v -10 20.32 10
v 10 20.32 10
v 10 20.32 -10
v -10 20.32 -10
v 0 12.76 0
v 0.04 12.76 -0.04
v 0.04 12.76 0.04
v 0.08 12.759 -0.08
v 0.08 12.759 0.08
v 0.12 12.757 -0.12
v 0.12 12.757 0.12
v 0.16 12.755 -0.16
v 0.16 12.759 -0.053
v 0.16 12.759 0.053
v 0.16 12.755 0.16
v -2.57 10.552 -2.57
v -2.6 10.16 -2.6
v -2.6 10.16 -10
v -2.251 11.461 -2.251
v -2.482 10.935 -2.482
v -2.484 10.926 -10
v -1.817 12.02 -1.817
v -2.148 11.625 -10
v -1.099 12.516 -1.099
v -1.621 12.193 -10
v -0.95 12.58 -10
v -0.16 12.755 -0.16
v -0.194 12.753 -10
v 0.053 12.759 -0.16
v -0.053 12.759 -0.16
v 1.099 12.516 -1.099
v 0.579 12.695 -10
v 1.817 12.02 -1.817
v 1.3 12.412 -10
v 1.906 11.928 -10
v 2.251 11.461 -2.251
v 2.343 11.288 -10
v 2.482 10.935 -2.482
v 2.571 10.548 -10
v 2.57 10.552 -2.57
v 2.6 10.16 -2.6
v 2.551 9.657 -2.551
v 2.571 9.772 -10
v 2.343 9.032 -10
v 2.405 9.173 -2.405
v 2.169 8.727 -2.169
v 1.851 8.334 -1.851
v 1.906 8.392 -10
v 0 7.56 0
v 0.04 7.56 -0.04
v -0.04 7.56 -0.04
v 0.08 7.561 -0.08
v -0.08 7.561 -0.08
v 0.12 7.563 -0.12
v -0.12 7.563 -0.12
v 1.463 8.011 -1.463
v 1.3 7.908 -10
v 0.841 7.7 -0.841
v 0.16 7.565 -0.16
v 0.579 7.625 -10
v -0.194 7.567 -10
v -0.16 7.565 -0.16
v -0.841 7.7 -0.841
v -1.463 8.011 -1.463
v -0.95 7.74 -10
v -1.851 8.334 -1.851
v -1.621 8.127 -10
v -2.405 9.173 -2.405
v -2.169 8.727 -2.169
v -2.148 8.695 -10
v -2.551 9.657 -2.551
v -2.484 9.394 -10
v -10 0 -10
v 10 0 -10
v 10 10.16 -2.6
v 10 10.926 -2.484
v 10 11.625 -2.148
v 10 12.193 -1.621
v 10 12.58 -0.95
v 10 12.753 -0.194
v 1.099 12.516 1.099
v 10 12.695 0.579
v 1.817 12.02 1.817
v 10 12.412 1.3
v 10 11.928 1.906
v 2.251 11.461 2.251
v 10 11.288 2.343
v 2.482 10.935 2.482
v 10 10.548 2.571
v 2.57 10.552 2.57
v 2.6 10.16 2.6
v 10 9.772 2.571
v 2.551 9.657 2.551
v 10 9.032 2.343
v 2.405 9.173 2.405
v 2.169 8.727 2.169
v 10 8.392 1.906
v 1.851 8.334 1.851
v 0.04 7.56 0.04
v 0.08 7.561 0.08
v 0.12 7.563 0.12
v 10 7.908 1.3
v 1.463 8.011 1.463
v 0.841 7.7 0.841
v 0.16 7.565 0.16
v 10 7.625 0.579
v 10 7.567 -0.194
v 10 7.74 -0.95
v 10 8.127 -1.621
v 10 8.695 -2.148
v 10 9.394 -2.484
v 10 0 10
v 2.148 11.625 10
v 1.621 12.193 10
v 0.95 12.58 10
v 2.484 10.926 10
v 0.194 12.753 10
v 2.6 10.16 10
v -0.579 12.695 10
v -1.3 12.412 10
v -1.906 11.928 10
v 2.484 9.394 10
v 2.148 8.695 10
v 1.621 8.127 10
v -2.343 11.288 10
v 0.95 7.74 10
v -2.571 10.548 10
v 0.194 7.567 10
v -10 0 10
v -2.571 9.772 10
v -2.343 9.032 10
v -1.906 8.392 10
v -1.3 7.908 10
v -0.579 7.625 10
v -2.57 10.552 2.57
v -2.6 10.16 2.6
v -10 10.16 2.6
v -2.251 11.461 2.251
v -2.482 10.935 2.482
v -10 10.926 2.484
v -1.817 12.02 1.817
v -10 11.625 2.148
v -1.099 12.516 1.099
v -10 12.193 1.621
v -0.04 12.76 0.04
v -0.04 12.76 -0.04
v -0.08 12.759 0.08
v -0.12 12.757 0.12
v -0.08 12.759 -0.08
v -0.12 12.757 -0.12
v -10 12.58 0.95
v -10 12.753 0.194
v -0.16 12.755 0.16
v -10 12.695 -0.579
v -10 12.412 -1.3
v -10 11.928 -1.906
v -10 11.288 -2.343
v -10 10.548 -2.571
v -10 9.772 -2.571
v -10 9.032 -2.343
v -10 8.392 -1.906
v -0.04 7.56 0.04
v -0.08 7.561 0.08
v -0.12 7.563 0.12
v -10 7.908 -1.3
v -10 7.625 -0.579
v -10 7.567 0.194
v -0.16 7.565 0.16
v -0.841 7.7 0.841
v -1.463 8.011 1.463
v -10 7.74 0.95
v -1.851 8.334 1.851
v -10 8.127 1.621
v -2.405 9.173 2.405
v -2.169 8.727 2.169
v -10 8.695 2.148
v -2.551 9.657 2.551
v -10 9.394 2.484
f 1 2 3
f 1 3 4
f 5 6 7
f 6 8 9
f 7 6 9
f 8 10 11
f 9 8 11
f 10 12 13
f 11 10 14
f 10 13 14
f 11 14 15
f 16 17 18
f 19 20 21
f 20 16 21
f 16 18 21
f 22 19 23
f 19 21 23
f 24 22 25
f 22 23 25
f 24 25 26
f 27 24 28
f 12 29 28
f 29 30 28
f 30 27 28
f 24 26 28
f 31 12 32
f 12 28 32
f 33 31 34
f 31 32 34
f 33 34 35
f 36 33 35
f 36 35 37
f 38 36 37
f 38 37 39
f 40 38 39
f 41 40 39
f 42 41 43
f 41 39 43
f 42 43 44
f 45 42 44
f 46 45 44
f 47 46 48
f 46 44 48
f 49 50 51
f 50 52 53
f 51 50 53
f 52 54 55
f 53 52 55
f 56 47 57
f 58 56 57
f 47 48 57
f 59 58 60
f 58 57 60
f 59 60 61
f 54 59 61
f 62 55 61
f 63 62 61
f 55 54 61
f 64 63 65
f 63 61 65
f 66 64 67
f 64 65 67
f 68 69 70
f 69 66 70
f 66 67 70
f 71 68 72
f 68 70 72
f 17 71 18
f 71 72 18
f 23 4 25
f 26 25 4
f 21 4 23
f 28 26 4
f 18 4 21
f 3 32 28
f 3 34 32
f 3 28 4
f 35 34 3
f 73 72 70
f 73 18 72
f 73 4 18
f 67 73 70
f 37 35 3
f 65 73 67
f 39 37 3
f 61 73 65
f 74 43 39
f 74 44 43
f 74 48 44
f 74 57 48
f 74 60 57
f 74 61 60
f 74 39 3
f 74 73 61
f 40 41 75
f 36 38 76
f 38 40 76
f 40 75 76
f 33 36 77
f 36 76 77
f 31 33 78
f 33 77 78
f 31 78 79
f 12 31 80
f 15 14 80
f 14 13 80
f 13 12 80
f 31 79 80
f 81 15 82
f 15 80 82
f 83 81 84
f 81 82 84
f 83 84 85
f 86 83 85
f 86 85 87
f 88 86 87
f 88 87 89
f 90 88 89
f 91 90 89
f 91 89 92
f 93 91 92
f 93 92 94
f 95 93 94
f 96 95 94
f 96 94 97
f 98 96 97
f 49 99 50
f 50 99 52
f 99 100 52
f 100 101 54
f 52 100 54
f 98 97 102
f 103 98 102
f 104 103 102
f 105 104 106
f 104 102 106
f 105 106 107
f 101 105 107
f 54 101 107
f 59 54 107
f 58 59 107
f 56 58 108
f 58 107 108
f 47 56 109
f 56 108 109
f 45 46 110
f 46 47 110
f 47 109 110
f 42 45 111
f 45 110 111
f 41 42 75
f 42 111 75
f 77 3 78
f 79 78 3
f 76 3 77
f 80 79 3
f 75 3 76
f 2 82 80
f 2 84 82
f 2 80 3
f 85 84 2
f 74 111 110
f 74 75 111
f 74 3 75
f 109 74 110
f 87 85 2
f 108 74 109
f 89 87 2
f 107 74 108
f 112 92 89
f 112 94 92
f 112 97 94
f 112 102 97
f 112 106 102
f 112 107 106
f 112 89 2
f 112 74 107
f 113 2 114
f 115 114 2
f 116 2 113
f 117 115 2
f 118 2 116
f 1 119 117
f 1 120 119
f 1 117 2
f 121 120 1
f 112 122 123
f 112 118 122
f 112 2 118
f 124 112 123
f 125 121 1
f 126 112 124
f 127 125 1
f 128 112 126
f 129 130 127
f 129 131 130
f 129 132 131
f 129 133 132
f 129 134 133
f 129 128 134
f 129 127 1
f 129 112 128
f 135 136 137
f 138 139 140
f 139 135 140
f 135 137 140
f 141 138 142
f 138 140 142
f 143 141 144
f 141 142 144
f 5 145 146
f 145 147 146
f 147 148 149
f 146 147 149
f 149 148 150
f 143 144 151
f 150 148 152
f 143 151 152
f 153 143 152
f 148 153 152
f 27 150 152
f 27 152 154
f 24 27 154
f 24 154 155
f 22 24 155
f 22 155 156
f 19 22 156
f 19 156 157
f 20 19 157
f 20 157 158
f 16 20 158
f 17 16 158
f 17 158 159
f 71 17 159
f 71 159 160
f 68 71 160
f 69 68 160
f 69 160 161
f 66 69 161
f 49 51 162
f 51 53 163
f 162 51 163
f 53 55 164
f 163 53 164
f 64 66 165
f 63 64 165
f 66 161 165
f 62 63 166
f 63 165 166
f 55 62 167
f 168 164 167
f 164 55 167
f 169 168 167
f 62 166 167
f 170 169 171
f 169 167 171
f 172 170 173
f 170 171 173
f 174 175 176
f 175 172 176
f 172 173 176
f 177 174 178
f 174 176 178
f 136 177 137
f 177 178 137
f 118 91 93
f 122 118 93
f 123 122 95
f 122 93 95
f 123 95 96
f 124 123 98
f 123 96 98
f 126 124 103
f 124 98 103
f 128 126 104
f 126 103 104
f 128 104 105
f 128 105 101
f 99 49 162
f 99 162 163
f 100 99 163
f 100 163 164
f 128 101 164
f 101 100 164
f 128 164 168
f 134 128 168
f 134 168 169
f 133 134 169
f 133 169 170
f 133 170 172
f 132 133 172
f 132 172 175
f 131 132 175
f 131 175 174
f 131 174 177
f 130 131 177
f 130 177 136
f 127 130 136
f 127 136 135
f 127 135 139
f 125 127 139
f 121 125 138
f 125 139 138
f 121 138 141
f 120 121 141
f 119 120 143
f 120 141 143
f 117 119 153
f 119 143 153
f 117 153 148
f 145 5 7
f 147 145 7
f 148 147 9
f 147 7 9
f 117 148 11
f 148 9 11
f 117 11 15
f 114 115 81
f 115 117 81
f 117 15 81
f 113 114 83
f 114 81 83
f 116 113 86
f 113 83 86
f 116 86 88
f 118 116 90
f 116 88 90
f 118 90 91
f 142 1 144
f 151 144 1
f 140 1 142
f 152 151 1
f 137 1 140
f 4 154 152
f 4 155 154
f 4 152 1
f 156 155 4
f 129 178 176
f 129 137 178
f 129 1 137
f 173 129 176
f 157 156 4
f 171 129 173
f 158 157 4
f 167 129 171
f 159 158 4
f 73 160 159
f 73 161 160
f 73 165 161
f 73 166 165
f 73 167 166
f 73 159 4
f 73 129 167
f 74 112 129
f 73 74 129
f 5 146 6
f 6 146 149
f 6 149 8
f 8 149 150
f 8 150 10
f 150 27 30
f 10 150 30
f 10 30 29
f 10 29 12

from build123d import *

# Parameters (mm, degrees)
BOSS_EXTRUDE1_DEPTH = 20.32
SKETCH3_R           = 2.6
CUT_EXTRUDE1_DEPTH  = 10.16
CIRPATTERN1_COUNT   = 4


with BuildPart() as part:
    # Sketch2 → Boss-Extrude1 (new body)
    with BuildSketch(Plane(origin=(0, 0, 0), x_dir=(1, 0, 0), z_dir=(0, 1, 0))):
        Polygon((-9.999999999999998, 10), (10.000000000000002, 10), (10.000000000000005, -10), (-9.999999999999995, -10), align=None)
    extrude(amount=BOSS_EXTRUDE1_DEPTH)

    # Sketch3 → Cut-Extrude1 (cut)
    with BuildSketch(Plane.XY.offset(10)):
        with Locations((8.7e-16, 10.16)):
            Circle(SKETCH3_R)
    cut_extrude1 = extrude(amount=-CUT_EXTRUDE1_DEPTH, mode=Mode.SUBTRACT)

    # CirPattern1: Cut-Extrude1 ×4 about axis
    cirpattern1_axis = Axis((1.73e-15, 20.32, 0), (-9e-17, -1, 0))
    for i in range(1, CIRPATTERN1_COUNT):
        add(cut_extrude1.rotate(cirpattern1_axis, i * 360 / CIRPATTERN1_COUNT), mode=Mode.SUBTRACT)


solid = part.part
